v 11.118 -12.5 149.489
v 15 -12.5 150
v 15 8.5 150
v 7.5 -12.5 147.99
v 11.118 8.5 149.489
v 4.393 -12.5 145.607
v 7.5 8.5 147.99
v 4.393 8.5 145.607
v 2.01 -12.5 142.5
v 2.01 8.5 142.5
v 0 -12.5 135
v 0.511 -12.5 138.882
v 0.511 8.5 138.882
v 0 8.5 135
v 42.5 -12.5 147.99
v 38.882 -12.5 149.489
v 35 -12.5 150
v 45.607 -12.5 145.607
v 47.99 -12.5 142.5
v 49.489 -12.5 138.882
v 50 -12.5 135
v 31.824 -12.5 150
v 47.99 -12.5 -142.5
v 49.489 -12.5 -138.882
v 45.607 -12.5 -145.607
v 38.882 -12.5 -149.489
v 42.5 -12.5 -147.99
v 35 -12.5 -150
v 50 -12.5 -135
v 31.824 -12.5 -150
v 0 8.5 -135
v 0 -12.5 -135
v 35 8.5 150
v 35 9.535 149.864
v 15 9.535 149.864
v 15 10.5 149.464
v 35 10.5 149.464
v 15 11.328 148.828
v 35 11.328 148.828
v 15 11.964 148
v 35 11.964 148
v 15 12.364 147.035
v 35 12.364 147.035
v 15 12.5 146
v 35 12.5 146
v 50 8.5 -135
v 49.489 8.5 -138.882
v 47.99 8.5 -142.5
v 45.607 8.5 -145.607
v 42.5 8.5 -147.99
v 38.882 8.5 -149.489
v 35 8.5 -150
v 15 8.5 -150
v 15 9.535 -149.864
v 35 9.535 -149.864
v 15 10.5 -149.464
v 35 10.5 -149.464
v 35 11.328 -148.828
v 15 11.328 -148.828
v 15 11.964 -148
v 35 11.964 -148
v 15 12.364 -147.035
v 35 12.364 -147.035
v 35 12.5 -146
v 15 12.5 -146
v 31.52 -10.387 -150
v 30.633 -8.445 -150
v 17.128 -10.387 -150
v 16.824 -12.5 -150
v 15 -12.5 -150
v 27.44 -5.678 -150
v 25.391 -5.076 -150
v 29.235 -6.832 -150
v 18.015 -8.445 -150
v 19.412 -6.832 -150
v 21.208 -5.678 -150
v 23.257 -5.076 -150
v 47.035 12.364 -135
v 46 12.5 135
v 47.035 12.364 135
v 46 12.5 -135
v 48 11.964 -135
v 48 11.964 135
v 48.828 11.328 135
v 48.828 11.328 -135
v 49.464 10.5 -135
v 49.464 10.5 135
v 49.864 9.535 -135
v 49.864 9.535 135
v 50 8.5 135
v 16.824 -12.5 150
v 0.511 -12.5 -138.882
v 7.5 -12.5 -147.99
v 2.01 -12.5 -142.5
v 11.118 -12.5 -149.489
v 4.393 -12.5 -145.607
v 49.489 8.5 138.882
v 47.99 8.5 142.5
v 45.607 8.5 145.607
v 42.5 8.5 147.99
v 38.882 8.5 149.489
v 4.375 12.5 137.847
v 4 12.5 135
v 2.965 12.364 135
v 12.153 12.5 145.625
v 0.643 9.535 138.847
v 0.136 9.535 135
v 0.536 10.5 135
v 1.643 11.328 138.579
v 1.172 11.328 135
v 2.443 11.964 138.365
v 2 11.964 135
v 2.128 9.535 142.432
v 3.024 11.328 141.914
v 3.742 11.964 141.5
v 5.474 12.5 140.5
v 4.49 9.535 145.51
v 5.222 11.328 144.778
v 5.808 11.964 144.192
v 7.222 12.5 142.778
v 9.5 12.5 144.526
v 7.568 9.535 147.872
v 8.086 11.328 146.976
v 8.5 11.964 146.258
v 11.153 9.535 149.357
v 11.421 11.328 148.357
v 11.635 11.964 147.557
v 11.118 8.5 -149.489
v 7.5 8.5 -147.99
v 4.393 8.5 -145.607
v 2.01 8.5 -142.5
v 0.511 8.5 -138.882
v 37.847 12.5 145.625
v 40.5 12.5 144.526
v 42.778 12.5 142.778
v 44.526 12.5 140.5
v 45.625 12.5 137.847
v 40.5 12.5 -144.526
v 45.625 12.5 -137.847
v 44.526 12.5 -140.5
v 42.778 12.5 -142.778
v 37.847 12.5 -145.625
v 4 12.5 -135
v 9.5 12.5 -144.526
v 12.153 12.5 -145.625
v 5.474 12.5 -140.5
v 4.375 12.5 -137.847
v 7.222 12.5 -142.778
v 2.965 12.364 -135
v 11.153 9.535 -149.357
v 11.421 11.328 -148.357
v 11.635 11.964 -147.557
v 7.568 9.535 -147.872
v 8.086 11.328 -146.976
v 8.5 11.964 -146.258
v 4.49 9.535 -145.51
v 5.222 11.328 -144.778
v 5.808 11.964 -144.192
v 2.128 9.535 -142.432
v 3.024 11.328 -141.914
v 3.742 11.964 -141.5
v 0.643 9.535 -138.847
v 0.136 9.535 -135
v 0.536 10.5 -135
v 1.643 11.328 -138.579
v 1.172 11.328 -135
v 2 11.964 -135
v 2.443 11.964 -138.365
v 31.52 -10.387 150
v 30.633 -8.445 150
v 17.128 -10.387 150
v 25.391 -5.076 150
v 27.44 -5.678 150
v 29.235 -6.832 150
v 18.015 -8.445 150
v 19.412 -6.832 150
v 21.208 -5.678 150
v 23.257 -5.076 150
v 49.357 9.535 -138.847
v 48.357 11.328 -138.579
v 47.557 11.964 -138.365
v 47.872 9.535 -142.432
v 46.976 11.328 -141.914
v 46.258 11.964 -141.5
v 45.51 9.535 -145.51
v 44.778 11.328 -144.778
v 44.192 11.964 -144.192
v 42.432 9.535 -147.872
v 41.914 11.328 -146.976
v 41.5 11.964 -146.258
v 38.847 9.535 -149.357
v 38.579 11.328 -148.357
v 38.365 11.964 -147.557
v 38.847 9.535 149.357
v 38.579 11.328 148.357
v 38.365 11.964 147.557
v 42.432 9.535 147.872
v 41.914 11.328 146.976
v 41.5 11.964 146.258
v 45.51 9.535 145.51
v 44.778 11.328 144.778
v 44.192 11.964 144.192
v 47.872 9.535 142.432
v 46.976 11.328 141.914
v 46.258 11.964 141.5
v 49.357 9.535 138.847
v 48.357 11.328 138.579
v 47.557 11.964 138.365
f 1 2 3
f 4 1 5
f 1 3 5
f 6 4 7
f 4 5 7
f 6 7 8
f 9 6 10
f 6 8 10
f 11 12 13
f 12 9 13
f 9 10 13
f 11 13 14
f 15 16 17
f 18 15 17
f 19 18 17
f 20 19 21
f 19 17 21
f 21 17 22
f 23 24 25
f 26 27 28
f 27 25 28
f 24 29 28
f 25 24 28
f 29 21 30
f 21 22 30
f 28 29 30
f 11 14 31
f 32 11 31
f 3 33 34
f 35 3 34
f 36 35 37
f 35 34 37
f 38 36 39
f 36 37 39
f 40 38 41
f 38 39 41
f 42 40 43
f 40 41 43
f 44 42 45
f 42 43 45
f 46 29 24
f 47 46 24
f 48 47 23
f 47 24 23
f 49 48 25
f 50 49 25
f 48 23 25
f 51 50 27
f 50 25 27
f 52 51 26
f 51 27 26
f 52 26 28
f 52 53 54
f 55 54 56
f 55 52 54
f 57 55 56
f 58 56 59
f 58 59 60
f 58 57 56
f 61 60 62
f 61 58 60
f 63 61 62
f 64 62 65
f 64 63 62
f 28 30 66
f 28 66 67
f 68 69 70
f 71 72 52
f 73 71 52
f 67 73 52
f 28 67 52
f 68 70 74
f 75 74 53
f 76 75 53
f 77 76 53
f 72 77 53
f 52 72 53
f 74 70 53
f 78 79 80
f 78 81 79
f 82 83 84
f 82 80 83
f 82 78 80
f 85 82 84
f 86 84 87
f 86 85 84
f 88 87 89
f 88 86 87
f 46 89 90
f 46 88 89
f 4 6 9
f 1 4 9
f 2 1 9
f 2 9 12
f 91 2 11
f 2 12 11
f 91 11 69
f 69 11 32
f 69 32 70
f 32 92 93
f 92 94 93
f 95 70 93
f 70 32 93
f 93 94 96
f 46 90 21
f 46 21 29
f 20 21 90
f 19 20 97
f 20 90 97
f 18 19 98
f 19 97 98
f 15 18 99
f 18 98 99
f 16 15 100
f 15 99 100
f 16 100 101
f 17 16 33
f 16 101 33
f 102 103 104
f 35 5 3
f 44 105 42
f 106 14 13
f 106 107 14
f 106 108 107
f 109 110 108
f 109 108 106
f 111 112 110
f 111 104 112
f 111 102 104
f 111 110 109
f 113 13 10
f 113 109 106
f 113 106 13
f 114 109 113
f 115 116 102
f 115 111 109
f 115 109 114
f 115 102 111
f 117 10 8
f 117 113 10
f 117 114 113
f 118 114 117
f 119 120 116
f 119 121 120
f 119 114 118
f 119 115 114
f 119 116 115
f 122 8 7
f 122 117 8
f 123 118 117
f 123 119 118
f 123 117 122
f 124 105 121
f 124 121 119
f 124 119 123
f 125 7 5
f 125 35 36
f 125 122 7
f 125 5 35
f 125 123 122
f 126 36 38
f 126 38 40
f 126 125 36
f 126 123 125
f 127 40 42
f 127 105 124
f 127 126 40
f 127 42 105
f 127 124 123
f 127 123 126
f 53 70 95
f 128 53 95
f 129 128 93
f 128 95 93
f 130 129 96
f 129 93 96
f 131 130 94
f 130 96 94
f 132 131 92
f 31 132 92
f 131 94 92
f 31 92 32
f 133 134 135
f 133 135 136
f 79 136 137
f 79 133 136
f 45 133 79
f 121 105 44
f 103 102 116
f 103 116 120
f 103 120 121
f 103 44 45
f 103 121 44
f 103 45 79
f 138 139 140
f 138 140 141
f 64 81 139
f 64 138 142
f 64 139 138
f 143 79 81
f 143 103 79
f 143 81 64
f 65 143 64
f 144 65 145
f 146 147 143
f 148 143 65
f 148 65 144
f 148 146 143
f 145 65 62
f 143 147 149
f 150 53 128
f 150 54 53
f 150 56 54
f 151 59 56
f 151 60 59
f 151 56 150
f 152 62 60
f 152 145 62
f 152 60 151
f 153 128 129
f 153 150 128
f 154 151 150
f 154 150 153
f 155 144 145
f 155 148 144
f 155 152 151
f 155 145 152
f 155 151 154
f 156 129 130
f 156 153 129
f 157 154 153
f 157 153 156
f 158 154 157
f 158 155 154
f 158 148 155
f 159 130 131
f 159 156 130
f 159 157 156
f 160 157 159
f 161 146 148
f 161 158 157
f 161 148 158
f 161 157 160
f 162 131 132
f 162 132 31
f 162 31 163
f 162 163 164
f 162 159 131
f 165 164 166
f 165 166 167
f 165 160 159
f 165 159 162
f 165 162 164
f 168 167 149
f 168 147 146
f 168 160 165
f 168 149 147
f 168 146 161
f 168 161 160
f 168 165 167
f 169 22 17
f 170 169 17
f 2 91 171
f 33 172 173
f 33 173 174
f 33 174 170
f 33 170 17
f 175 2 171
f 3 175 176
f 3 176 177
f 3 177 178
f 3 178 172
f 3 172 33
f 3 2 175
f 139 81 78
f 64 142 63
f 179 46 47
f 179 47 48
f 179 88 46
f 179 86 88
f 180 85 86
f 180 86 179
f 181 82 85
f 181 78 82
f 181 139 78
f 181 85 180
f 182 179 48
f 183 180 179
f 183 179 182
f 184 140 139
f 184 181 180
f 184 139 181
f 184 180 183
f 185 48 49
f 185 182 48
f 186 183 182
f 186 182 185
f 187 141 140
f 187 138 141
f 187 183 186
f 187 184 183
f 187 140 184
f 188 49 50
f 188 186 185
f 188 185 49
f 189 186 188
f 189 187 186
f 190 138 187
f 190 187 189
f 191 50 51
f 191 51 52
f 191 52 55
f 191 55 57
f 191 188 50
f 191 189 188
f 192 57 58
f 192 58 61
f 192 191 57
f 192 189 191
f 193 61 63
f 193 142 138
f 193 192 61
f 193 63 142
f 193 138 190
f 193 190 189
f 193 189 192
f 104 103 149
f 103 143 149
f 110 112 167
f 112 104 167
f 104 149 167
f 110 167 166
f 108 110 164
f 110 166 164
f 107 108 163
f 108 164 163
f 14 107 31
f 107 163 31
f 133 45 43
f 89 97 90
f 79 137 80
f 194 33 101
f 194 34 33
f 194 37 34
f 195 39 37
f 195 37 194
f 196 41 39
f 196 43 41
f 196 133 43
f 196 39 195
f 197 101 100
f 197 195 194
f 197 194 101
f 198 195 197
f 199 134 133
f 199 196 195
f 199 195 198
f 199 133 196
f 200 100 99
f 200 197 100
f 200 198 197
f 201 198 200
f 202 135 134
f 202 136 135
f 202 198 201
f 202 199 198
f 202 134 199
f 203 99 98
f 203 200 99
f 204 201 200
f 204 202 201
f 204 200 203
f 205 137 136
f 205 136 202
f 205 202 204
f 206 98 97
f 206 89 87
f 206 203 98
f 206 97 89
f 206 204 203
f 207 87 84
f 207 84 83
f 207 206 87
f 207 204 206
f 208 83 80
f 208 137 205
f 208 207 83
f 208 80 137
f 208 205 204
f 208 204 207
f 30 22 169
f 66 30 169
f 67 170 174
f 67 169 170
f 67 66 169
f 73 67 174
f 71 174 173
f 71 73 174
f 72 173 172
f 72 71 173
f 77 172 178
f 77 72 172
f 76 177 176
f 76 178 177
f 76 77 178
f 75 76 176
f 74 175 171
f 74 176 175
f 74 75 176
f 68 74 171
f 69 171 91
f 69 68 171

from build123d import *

# Parameters (mm, degrees)
ESBO_O1_W                  = 300
ESBO_O1_H                  = 25
RESSALTO_EXTRUS_O1_DEPTH   = 50
FILETE1_R                  = 4
FILETE2_R                  = 15
CORTE_EXTRUS_O2_DEPTH      = 159.607219382
CORTE_EXTRUS_O2_DEPTH_BACK = 159.607219382
ESBO_O8_R                  = 7.5


with BuildPart() as part:
    # Esboço1 → Ressalto-extrusão1 (new body)
    with BuildSketch(Plane(origin=(0, 0, 0), x_dir=(0, 0, -1), z_dir=(1, 0, 0))):
        Rectangle(ESBO_O1_W, ESBO_O1_H)
    extrude(amount=RESSALTO_EXTRUS_O1_DEPTH)

    # Filete1
    filete1_edges = [part.edges().sort_by_distance(p)[0] for p in [
        (50, 12.5, 0),
        (0, 12.5, 0),
        (25, 12.5, 150),
        (25, 12.5, -150),
    ]]
    fillet(filete1_edges, radius=FILETE1_R)

    # Filete2
    # the kernel refuses this fillet: 15 mm, written as the material it takes off along each edge
    with BuildSketch(Plane(origin=(35, 12.5, 135), x_dir=(0, 0, 1), z_dir=(-1, 0, 0))) as filete2_piece_1:
        with BuildLine():
            CenterArc((11, -4), 4, 0, 90)
            Line((15, -4), (15, 0))
            Line((15, 0), (11, 0))
        make_face()
    revolve(axis=Axis((35, 12.5, 135), (0, 1, 0)), revolution_arc=90, mode=Mode.SUBTRACT)
    with BuildSketch(Plane(origin=(15, 12.5, 135), x_dir=(-1, 0, 0), z_dir=(0, 0, -1))) as filete2_piece_2:
        with BuildLine():
            CenterArc((11, -4), 4, 0, 90)
            Line((15, -4), (15, 0))
            Line((15, 0), (11, 0))
        make_face()
    revolve(axis=Axis((15, 12.5, 135), (0, 1, 0)), revolution_arc=90, mode=Mode.SUBTRACT)
    with BuildSketch(Plane(origin=(35, 12.5, -135), x_dir=(1, 0, 0), z_dir=(0, 0, 1))) as filete2_piece_3:
        with BuildLine():
            CenterArc((11, -4), 4, 0, 90)
            Line((15, -4), (15, 0))
            Line((15, 0), (11, 0))
        make_face()
    revolve(axis=Axis((35, 12.5, -135), (0, 1, 0)), revolution_arc=90, mode=Mode.SUBTRACT)
    with BuildSketch(Plane(origin=(15, 12.5, -135), x_dir=(0, 0, -1), z_dir=(1, 0, 0))) as filete2_piece_4:
        with BuildLine():
            CenterArc((11, -4), 4, 0, 90)
            Line((15, -4), (15, 0))
            Line((15, 0), (11, 0))
        make_face()
    revolve(axis=Axis((15, 12.5, -135), (0, 1, 0)), revolution_arc=90, mode=Mode.SUBTRACT)
    with BuildSketch(Plane(origin=(50, 12.5, 150), x_dir=(0, 0, -1), z_dir=(0, -1, 0)), Plane(origin=(0, -50, -150), x_dir=(1, 0, 0), z_dir=(0, 1, 0))) as filete2_piece_5:
        with BuildLine():
            CenterArc((FILETE2_R, -FILETE2_R), FILETE2_R, 90, 90)
            Line((0, -FILETE2_R), (0, 0))
            Line((0, 0), (FILETE2_R, 0))
        make_face()
    extrude(amount=62.5, mode=Mode.SUBTRACT)
    with BuildSketch(Plane(origin=(0, 12.5, 150), x_dir=(0, 0, -1), z_dir=(0, -1, 0)), Plane(origin=(50, -50, -150), x_dir=(-1, 0, 0), z_dir=(0, 1, 0))) as filete2_piece_6:
        with BuildLine():
            CenterArc((FILETE2_R, FILETE2_R), FILETE2_R, 180, 90)
            Line((0, FILETE2_R), (0, 0))
            Line((0, 0), (FILETE2_R, 0))
        make_face()
    extrude(amount=62.5, mode=Mode.SUBTRACT)

    # Esboço8 → Corte-extrusão2 (cut, two sides: drawn at the far end of the back side and taken through both)
    with BuildSketch(Plane.XY.offset(-CORTE_EXTRUS_O2_DEPTH_BACK)):
        with Locations((24.323943137, -12.5)):
            Circle(ESBO_O8_R)
    extrude(amount=CORTE_EXTRUS_O2_DEPTH + CORTE_EXTRUS_O2_DEPTH_BACK, mode=Mode.SUBTRACT)


solid = part.part
